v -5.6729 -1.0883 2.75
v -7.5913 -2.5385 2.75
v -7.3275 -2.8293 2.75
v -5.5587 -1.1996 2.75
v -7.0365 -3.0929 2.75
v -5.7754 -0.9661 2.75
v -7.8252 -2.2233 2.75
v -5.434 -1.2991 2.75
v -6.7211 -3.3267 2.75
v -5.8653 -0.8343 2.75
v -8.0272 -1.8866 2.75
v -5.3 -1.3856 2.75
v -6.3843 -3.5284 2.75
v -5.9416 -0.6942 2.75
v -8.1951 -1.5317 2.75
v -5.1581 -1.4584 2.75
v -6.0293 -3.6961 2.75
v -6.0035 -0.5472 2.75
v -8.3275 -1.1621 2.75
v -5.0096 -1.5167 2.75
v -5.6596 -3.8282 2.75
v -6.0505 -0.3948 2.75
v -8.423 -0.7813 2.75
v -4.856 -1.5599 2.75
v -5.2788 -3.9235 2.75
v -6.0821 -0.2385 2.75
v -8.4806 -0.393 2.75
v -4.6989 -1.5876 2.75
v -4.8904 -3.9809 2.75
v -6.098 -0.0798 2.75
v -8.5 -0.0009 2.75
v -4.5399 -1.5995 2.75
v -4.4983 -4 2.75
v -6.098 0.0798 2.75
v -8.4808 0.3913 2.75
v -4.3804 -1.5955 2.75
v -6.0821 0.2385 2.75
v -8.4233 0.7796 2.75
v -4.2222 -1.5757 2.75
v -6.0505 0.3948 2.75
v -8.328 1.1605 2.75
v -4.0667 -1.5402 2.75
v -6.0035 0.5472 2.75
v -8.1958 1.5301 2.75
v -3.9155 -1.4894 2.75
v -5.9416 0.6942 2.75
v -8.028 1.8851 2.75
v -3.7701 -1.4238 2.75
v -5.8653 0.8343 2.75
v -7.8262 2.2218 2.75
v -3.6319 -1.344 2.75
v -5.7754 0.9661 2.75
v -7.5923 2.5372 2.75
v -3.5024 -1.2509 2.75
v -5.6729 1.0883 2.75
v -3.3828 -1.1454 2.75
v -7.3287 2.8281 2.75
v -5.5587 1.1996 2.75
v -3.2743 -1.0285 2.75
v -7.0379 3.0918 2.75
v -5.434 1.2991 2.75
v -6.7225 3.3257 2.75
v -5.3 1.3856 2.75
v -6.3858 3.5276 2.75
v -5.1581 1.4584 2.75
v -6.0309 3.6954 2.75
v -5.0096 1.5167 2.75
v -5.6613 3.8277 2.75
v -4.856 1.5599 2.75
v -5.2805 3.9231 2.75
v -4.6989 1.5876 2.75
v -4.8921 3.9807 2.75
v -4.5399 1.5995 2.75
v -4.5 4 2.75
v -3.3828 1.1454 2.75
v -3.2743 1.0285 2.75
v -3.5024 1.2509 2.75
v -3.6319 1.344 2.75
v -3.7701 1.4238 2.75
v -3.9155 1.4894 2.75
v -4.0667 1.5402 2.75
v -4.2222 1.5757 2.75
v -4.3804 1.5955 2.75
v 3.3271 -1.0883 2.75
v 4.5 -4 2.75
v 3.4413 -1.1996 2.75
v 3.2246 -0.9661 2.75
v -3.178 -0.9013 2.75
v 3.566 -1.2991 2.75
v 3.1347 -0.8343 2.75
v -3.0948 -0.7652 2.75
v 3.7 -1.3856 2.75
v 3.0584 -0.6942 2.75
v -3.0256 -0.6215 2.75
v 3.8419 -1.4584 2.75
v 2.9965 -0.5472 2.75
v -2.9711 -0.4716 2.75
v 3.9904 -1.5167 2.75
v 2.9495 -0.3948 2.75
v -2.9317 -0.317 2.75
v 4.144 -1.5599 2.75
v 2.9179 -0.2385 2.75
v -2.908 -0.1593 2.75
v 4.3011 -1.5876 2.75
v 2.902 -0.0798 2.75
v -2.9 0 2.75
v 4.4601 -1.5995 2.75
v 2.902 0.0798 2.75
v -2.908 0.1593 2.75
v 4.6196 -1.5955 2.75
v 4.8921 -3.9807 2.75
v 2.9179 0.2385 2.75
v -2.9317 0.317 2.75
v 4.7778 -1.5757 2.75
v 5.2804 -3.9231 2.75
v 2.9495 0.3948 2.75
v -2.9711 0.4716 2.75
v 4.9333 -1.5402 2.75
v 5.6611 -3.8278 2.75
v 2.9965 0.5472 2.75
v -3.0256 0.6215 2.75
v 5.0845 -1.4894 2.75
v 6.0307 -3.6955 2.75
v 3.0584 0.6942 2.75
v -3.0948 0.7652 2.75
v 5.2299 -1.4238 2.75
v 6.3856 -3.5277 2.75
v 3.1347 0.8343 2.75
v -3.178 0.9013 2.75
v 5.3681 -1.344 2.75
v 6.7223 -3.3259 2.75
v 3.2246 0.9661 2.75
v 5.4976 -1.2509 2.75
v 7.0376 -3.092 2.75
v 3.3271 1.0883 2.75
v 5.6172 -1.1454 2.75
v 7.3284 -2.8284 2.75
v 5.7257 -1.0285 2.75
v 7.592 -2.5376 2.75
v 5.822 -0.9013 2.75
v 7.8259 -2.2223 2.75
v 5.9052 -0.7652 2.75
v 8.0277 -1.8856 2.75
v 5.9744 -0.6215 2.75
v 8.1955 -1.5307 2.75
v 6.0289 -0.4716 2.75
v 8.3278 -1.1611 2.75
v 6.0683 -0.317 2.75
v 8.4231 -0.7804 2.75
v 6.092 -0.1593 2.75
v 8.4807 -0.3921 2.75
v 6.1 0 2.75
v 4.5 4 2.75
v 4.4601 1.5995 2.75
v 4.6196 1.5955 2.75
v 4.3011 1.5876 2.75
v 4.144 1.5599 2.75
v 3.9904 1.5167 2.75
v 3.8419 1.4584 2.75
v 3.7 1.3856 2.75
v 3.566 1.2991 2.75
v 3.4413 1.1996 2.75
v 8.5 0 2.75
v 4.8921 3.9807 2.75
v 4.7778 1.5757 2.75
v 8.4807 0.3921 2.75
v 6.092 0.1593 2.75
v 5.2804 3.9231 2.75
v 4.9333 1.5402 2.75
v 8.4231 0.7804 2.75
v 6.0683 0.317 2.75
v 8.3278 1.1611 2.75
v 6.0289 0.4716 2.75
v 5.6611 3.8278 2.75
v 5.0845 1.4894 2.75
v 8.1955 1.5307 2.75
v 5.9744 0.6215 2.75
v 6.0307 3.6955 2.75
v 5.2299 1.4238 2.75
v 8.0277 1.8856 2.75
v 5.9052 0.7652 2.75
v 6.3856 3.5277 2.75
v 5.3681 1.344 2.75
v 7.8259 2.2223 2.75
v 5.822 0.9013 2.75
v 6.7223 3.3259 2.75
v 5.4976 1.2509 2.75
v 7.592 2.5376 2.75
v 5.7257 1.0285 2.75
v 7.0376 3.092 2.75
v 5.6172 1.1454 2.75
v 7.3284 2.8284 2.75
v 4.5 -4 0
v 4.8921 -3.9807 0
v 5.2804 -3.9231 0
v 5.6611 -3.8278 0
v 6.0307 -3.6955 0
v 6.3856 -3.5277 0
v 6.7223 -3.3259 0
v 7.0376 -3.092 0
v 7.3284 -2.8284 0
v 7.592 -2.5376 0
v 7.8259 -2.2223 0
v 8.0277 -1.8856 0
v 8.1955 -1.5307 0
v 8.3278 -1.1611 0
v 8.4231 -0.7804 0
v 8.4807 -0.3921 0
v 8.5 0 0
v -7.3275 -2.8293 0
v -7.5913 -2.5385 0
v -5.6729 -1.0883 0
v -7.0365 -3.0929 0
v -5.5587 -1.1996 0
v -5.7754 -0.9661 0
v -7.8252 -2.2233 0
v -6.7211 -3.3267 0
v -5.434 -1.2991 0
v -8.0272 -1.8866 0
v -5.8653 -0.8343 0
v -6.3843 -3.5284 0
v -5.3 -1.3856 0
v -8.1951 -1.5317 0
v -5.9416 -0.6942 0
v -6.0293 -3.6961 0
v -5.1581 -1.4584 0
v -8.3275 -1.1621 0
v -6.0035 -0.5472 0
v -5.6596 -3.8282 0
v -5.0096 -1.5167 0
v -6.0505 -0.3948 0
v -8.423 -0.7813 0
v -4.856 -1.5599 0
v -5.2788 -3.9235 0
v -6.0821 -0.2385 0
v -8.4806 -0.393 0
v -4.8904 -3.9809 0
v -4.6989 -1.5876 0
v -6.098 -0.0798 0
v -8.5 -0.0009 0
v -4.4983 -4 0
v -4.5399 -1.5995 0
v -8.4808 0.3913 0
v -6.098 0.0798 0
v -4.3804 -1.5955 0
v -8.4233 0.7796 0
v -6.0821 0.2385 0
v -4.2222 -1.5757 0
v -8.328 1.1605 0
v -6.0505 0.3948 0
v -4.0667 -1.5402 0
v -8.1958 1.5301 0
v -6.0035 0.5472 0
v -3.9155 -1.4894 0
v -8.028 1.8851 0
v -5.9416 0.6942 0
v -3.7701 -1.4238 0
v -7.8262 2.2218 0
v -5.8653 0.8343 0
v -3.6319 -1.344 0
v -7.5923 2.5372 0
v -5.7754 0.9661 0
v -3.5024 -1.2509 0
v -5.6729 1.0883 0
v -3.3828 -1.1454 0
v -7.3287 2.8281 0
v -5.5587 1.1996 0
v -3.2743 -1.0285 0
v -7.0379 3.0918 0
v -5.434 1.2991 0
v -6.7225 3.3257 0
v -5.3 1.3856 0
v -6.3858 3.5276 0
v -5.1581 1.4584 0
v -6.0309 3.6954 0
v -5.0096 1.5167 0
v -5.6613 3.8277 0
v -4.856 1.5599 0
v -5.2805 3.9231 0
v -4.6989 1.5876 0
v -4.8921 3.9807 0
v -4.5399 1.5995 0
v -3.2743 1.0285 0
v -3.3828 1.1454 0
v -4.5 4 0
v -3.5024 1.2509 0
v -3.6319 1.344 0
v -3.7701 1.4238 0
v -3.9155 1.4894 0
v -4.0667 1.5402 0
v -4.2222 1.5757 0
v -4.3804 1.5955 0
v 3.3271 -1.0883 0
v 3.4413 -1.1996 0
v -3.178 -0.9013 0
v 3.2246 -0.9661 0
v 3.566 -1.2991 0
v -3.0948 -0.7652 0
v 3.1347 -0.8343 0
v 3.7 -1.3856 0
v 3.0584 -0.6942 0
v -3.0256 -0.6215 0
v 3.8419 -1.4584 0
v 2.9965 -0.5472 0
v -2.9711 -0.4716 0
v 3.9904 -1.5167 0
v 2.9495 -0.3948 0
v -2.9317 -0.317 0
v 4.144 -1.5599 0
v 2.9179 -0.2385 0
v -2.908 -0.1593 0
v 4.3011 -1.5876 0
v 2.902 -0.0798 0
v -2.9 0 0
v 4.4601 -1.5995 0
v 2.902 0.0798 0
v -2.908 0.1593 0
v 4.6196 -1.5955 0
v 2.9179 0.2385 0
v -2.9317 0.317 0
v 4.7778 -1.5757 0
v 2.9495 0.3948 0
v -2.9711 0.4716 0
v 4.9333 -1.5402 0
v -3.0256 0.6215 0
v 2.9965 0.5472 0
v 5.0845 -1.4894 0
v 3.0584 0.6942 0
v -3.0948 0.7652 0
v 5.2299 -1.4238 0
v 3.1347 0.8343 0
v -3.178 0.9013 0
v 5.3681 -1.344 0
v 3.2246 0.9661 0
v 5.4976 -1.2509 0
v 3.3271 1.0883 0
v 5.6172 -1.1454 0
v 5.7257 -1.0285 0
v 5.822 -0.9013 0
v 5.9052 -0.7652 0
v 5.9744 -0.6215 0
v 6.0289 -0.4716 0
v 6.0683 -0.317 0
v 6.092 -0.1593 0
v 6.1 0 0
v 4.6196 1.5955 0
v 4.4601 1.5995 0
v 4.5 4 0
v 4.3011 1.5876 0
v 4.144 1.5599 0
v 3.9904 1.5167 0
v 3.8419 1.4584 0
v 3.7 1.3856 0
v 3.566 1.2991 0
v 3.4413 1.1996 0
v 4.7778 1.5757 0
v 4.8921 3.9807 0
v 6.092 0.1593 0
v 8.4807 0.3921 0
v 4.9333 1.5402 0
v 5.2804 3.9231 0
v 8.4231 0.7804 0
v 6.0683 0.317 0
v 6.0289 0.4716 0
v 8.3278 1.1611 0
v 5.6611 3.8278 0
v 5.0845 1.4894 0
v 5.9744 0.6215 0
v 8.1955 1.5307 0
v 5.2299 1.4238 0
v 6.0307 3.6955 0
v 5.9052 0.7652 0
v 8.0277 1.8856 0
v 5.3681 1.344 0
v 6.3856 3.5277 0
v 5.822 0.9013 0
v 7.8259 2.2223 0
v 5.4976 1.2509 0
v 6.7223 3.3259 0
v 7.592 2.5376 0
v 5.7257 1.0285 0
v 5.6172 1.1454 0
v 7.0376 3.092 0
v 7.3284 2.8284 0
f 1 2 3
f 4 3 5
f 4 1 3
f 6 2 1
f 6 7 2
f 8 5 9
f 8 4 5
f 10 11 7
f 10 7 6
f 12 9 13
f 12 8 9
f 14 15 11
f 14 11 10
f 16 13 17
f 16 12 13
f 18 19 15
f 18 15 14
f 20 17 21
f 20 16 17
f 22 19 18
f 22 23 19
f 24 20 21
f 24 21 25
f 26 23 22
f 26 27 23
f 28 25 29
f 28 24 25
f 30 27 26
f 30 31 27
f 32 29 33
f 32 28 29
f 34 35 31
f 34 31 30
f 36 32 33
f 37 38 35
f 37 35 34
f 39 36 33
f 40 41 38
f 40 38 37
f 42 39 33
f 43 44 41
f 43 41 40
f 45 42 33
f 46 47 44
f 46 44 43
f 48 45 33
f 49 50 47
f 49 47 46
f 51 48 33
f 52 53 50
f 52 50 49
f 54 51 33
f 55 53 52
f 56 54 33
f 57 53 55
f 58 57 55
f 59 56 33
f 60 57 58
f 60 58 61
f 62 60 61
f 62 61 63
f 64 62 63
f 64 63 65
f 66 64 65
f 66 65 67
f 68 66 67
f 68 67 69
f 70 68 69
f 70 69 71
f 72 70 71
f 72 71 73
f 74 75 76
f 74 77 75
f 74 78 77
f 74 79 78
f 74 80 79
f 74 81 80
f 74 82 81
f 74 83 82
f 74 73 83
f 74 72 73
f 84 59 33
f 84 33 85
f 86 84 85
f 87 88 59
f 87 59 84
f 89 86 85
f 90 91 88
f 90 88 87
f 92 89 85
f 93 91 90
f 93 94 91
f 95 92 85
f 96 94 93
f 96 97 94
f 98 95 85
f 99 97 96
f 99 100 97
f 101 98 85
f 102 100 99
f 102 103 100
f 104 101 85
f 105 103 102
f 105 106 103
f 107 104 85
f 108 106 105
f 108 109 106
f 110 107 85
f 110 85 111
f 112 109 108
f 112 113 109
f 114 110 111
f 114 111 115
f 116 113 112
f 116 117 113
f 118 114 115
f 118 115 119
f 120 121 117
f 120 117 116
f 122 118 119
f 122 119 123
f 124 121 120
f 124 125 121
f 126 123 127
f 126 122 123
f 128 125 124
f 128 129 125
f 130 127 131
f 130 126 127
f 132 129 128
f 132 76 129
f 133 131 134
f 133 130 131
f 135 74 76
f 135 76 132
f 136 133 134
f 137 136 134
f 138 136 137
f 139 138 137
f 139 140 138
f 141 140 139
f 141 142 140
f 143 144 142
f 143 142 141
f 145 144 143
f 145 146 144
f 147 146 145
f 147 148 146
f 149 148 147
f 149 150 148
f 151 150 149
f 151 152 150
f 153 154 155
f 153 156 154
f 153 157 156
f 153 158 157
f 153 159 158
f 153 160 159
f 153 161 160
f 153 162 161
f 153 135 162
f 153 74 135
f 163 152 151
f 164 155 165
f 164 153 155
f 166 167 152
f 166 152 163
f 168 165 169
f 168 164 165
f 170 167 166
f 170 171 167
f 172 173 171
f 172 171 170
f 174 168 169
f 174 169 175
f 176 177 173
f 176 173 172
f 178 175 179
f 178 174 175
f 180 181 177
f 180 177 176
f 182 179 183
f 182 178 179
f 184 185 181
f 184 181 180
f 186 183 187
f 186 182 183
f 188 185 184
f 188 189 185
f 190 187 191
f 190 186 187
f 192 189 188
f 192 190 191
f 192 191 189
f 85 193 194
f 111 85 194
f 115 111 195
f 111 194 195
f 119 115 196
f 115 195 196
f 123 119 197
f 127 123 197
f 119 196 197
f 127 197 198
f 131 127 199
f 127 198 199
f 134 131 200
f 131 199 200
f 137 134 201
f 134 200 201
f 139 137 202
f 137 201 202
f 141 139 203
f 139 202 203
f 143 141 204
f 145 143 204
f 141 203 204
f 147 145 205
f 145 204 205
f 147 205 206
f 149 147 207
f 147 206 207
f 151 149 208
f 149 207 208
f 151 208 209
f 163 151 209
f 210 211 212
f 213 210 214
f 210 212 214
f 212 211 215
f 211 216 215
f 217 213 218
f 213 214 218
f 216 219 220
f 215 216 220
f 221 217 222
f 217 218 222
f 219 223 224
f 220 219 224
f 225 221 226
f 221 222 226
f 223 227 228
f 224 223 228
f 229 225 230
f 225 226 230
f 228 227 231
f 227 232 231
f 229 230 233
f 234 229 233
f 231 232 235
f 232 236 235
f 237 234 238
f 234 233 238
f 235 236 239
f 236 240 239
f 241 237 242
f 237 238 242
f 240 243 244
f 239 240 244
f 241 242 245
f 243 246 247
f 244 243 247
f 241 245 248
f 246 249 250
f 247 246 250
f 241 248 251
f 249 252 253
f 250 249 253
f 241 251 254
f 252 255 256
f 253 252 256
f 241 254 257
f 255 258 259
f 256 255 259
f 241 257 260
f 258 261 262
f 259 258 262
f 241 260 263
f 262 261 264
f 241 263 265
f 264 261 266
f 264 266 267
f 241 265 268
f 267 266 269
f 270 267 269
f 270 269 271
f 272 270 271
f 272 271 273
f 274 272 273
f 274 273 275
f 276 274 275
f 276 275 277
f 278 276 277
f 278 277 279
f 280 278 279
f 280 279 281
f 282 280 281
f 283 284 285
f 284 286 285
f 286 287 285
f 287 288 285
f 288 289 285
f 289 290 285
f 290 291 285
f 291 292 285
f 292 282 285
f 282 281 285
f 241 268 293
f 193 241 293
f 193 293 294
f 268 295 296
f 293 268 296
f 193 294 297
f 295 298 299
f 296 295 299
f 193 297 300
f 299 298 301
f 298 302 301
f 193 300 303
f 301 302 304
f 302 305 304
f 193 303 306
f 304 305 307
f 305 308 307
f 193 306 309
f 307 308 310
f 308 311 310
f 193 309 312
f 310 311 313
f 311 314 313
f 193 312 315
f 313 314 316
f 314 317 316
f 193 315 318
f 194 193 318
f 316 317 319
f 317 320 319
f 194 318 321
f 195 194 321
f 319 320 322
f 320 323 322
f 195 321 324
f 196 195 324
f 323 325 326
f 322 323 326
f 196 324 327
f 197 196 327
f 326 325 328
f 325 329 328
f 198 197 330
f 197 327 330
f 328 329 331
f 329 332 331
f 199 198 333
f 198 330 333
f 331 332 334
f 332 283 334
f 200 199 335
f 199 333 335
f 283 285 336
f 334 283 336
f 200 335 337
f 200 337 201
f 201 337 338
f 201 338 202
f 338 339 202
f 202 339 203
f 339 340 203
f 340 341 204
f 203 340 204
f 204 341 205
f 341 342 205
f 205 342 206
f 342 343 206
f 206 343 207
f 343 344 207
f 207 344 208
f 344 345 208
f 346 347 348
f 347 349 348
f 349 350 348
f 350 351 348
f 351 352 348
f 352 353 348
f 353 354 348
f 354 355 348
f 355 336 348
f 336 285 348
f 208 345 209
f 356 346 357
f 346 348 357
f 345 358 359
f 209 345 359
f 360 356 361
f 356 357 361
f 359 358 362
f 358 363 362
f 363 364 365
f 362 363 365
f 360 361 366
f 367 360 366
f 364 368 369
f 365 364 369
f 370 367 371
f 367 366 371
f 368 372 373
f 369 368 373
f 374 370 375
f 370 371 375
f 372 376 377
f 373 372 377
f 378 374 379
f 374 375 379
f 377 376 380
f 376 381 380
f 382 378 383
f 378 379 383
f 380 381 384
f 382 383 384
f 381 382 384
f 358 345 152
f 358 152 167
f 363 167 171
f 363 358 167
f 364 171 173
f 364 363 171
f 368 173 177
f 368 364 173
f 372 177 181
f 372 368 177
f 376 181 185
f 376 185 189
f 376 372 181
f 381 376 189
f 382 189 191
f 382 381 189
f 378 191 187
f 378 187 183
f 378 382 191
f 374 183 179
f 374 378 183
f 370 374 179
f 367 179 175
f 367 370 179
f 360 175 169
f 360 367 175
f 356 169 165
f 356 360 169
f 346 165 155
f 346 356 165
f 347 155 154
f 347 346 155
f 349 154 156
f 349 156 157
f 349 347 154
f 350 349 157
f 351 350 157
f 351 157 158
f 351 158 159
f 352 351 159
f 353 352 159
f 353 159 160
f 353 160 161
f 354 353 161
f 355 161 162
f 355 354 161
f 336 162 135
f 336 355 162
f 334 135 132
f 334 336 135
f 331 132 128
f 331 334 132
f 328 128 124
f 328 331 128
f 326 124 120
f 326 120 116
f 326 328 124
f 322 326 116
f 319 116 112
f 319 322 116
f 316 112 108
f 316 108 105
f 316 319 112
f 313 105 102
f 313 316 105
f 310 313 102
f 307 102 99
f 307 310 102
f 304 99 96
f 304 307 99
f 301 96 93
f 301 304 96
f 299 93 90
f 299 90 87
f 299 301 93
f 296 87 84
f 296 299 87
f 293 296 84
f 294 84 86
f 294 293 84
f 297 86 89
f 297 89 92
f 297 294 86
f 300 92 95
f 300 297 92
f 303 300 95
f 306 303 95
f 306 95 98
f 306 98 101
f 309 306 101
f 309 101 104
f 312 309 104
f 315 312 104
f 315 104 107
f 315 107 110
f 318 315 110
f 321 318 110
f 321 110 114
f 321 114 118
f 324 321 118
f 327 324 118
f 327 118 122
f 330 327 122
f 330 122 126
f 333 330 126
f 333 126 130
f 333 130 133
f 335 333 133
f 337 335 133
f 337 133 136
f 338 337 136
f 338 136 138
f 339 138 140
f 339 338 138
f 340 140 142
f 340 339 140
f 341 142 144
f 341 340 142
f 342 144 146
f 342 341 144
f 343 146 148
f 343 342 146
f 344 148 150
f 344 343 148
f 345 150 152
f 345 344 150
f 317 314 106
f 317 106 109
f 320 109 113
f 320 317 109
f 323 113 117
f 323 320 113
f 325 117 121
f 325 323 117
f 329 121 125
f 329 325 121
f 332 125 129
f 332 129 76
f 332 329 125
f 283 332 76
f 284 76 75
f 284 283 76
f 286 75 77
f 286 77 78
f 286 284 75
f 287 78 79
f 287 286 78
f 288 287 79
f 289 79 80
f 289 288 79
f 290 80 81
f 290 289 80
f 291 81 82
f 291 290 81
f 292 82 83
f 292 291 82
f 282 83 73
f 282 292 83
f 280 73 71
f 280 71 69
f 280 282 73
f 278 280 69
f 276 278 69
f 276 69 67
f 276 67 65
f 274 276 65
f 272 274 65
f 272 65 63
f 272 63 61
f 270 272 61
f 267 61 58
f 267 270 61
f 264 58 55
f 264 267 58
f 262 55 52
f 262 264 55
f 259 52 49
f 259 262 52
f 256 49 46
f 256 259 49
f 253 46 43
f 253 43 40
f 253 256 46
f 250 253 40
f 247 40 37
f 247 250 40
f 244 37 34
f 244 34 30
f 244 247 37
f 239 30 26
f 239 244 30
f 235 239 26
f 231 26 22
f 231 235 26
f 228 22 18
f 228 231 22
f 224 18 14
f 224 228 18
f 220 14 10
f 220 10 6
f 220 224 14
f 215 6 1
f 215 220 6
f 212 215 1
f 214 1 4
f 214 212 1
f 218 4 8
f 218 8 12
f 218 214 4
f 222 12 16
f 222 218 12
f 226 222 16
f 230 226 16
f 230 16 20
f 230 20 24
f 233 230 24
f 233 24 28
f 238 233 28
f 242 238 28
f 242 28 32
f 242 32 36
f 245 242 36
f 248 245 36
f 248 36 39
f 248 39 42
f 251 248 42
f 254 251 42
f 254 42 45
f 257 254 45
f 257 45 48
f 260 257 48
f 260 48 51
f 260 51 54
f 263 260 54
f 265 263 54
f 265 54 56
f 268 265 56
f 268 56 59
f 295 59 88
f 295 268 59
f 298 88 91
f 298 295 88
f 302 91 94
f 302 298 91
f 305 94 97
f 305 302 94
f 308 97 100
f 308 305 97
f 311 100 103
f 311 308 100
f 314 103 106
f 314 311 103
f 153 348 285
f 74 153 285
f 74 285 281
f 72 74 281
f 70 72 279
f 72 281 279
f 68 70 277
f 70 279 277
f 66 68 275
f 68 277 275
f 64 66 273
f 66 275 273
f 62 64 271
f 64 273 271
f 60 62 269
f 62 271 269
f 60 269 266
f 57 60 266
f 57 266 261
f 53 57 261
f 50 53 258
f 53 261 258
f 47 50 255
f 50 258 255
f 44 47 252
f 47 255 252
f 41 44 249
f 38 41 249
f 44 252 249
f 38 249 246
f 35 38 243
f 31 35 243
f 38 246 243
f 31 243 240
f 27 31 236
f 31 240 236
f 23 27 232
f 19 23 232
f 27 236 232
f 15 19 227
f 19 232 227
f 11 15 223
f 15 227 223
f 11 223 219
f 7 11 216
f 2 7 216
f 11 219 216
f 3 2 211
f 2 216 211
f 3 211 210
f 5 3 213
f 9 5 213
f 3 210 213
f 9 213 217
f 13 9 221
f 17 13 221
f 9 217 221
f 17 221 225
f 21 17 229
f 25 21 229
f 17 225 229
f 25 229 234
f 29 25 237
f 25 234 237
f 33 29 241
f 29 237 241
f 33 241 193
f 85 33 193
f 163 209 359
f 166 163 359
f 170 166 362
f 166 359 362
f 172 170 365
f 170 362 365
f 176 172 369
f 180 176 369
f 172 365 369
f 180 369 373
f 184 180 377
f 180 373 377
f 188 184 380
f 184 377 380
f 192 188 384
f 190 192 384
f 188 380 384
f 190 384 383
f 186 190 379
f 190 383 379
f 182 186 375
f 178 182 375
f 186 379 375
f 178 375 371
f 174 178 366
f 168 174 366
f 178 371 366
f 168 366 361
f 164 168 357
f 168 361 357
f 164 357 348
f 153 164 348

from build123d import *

# Parameters (mm, degrees)
F0_R     = 1.6
F1_DEPTH = 2.75


with BuildPart() as f1:
    # F0 (on Top) → F1 (new body)
    with BuildSketch(Plane.XY):
        with BuildLine():
            ThreePointArc((-0.5, 0), (-1.671573, 2.828427), (-4.5, 4))
            ThreePointArc((-4.5, 4), (-8.5, -0.00086), (-4.49828, -4))
            ThreePointArc((-4.49828, -4), (-1.670965, -2.827819), (-0.5, 0))
        make_face()
        with Locations((-4.5, 0)):
            Circle(F0_R, mode=Mode.SUBTRACT)
        with BuildLine():
            ThreePointArc((4.5, -4), (0.5, 0), (4.5, 4))
            Line((4.5, 4), (-4.5, 4))
            ThreePointArc((-4.5, 4), (-1.671573, 2.828427), (-0.5, 0))
            ThreePointArc((-0.5, 0), (-1.670965, -2.827819), (-4.49828, -4))
            Line((-4.49828, -4), (4.5, -4))
        make_face()
        with BuildLine():
            ThreePointArc((4.5, -4), (7.328427, -2.828427), (8.5, 0))
            ThreePointArc((8.5, 0), (7.328427, 2.828427), (4.5, 4))
            ThreePointArc((4.5, 4), (0.5, 0), (4.5, -4))
        make_face()
        with Locations((4.5, 0)):
            Circle(F0_R, mode=Mode.SUBTRACT)
    extrude(amount=F1_DEPTH)


solid = f1.part
